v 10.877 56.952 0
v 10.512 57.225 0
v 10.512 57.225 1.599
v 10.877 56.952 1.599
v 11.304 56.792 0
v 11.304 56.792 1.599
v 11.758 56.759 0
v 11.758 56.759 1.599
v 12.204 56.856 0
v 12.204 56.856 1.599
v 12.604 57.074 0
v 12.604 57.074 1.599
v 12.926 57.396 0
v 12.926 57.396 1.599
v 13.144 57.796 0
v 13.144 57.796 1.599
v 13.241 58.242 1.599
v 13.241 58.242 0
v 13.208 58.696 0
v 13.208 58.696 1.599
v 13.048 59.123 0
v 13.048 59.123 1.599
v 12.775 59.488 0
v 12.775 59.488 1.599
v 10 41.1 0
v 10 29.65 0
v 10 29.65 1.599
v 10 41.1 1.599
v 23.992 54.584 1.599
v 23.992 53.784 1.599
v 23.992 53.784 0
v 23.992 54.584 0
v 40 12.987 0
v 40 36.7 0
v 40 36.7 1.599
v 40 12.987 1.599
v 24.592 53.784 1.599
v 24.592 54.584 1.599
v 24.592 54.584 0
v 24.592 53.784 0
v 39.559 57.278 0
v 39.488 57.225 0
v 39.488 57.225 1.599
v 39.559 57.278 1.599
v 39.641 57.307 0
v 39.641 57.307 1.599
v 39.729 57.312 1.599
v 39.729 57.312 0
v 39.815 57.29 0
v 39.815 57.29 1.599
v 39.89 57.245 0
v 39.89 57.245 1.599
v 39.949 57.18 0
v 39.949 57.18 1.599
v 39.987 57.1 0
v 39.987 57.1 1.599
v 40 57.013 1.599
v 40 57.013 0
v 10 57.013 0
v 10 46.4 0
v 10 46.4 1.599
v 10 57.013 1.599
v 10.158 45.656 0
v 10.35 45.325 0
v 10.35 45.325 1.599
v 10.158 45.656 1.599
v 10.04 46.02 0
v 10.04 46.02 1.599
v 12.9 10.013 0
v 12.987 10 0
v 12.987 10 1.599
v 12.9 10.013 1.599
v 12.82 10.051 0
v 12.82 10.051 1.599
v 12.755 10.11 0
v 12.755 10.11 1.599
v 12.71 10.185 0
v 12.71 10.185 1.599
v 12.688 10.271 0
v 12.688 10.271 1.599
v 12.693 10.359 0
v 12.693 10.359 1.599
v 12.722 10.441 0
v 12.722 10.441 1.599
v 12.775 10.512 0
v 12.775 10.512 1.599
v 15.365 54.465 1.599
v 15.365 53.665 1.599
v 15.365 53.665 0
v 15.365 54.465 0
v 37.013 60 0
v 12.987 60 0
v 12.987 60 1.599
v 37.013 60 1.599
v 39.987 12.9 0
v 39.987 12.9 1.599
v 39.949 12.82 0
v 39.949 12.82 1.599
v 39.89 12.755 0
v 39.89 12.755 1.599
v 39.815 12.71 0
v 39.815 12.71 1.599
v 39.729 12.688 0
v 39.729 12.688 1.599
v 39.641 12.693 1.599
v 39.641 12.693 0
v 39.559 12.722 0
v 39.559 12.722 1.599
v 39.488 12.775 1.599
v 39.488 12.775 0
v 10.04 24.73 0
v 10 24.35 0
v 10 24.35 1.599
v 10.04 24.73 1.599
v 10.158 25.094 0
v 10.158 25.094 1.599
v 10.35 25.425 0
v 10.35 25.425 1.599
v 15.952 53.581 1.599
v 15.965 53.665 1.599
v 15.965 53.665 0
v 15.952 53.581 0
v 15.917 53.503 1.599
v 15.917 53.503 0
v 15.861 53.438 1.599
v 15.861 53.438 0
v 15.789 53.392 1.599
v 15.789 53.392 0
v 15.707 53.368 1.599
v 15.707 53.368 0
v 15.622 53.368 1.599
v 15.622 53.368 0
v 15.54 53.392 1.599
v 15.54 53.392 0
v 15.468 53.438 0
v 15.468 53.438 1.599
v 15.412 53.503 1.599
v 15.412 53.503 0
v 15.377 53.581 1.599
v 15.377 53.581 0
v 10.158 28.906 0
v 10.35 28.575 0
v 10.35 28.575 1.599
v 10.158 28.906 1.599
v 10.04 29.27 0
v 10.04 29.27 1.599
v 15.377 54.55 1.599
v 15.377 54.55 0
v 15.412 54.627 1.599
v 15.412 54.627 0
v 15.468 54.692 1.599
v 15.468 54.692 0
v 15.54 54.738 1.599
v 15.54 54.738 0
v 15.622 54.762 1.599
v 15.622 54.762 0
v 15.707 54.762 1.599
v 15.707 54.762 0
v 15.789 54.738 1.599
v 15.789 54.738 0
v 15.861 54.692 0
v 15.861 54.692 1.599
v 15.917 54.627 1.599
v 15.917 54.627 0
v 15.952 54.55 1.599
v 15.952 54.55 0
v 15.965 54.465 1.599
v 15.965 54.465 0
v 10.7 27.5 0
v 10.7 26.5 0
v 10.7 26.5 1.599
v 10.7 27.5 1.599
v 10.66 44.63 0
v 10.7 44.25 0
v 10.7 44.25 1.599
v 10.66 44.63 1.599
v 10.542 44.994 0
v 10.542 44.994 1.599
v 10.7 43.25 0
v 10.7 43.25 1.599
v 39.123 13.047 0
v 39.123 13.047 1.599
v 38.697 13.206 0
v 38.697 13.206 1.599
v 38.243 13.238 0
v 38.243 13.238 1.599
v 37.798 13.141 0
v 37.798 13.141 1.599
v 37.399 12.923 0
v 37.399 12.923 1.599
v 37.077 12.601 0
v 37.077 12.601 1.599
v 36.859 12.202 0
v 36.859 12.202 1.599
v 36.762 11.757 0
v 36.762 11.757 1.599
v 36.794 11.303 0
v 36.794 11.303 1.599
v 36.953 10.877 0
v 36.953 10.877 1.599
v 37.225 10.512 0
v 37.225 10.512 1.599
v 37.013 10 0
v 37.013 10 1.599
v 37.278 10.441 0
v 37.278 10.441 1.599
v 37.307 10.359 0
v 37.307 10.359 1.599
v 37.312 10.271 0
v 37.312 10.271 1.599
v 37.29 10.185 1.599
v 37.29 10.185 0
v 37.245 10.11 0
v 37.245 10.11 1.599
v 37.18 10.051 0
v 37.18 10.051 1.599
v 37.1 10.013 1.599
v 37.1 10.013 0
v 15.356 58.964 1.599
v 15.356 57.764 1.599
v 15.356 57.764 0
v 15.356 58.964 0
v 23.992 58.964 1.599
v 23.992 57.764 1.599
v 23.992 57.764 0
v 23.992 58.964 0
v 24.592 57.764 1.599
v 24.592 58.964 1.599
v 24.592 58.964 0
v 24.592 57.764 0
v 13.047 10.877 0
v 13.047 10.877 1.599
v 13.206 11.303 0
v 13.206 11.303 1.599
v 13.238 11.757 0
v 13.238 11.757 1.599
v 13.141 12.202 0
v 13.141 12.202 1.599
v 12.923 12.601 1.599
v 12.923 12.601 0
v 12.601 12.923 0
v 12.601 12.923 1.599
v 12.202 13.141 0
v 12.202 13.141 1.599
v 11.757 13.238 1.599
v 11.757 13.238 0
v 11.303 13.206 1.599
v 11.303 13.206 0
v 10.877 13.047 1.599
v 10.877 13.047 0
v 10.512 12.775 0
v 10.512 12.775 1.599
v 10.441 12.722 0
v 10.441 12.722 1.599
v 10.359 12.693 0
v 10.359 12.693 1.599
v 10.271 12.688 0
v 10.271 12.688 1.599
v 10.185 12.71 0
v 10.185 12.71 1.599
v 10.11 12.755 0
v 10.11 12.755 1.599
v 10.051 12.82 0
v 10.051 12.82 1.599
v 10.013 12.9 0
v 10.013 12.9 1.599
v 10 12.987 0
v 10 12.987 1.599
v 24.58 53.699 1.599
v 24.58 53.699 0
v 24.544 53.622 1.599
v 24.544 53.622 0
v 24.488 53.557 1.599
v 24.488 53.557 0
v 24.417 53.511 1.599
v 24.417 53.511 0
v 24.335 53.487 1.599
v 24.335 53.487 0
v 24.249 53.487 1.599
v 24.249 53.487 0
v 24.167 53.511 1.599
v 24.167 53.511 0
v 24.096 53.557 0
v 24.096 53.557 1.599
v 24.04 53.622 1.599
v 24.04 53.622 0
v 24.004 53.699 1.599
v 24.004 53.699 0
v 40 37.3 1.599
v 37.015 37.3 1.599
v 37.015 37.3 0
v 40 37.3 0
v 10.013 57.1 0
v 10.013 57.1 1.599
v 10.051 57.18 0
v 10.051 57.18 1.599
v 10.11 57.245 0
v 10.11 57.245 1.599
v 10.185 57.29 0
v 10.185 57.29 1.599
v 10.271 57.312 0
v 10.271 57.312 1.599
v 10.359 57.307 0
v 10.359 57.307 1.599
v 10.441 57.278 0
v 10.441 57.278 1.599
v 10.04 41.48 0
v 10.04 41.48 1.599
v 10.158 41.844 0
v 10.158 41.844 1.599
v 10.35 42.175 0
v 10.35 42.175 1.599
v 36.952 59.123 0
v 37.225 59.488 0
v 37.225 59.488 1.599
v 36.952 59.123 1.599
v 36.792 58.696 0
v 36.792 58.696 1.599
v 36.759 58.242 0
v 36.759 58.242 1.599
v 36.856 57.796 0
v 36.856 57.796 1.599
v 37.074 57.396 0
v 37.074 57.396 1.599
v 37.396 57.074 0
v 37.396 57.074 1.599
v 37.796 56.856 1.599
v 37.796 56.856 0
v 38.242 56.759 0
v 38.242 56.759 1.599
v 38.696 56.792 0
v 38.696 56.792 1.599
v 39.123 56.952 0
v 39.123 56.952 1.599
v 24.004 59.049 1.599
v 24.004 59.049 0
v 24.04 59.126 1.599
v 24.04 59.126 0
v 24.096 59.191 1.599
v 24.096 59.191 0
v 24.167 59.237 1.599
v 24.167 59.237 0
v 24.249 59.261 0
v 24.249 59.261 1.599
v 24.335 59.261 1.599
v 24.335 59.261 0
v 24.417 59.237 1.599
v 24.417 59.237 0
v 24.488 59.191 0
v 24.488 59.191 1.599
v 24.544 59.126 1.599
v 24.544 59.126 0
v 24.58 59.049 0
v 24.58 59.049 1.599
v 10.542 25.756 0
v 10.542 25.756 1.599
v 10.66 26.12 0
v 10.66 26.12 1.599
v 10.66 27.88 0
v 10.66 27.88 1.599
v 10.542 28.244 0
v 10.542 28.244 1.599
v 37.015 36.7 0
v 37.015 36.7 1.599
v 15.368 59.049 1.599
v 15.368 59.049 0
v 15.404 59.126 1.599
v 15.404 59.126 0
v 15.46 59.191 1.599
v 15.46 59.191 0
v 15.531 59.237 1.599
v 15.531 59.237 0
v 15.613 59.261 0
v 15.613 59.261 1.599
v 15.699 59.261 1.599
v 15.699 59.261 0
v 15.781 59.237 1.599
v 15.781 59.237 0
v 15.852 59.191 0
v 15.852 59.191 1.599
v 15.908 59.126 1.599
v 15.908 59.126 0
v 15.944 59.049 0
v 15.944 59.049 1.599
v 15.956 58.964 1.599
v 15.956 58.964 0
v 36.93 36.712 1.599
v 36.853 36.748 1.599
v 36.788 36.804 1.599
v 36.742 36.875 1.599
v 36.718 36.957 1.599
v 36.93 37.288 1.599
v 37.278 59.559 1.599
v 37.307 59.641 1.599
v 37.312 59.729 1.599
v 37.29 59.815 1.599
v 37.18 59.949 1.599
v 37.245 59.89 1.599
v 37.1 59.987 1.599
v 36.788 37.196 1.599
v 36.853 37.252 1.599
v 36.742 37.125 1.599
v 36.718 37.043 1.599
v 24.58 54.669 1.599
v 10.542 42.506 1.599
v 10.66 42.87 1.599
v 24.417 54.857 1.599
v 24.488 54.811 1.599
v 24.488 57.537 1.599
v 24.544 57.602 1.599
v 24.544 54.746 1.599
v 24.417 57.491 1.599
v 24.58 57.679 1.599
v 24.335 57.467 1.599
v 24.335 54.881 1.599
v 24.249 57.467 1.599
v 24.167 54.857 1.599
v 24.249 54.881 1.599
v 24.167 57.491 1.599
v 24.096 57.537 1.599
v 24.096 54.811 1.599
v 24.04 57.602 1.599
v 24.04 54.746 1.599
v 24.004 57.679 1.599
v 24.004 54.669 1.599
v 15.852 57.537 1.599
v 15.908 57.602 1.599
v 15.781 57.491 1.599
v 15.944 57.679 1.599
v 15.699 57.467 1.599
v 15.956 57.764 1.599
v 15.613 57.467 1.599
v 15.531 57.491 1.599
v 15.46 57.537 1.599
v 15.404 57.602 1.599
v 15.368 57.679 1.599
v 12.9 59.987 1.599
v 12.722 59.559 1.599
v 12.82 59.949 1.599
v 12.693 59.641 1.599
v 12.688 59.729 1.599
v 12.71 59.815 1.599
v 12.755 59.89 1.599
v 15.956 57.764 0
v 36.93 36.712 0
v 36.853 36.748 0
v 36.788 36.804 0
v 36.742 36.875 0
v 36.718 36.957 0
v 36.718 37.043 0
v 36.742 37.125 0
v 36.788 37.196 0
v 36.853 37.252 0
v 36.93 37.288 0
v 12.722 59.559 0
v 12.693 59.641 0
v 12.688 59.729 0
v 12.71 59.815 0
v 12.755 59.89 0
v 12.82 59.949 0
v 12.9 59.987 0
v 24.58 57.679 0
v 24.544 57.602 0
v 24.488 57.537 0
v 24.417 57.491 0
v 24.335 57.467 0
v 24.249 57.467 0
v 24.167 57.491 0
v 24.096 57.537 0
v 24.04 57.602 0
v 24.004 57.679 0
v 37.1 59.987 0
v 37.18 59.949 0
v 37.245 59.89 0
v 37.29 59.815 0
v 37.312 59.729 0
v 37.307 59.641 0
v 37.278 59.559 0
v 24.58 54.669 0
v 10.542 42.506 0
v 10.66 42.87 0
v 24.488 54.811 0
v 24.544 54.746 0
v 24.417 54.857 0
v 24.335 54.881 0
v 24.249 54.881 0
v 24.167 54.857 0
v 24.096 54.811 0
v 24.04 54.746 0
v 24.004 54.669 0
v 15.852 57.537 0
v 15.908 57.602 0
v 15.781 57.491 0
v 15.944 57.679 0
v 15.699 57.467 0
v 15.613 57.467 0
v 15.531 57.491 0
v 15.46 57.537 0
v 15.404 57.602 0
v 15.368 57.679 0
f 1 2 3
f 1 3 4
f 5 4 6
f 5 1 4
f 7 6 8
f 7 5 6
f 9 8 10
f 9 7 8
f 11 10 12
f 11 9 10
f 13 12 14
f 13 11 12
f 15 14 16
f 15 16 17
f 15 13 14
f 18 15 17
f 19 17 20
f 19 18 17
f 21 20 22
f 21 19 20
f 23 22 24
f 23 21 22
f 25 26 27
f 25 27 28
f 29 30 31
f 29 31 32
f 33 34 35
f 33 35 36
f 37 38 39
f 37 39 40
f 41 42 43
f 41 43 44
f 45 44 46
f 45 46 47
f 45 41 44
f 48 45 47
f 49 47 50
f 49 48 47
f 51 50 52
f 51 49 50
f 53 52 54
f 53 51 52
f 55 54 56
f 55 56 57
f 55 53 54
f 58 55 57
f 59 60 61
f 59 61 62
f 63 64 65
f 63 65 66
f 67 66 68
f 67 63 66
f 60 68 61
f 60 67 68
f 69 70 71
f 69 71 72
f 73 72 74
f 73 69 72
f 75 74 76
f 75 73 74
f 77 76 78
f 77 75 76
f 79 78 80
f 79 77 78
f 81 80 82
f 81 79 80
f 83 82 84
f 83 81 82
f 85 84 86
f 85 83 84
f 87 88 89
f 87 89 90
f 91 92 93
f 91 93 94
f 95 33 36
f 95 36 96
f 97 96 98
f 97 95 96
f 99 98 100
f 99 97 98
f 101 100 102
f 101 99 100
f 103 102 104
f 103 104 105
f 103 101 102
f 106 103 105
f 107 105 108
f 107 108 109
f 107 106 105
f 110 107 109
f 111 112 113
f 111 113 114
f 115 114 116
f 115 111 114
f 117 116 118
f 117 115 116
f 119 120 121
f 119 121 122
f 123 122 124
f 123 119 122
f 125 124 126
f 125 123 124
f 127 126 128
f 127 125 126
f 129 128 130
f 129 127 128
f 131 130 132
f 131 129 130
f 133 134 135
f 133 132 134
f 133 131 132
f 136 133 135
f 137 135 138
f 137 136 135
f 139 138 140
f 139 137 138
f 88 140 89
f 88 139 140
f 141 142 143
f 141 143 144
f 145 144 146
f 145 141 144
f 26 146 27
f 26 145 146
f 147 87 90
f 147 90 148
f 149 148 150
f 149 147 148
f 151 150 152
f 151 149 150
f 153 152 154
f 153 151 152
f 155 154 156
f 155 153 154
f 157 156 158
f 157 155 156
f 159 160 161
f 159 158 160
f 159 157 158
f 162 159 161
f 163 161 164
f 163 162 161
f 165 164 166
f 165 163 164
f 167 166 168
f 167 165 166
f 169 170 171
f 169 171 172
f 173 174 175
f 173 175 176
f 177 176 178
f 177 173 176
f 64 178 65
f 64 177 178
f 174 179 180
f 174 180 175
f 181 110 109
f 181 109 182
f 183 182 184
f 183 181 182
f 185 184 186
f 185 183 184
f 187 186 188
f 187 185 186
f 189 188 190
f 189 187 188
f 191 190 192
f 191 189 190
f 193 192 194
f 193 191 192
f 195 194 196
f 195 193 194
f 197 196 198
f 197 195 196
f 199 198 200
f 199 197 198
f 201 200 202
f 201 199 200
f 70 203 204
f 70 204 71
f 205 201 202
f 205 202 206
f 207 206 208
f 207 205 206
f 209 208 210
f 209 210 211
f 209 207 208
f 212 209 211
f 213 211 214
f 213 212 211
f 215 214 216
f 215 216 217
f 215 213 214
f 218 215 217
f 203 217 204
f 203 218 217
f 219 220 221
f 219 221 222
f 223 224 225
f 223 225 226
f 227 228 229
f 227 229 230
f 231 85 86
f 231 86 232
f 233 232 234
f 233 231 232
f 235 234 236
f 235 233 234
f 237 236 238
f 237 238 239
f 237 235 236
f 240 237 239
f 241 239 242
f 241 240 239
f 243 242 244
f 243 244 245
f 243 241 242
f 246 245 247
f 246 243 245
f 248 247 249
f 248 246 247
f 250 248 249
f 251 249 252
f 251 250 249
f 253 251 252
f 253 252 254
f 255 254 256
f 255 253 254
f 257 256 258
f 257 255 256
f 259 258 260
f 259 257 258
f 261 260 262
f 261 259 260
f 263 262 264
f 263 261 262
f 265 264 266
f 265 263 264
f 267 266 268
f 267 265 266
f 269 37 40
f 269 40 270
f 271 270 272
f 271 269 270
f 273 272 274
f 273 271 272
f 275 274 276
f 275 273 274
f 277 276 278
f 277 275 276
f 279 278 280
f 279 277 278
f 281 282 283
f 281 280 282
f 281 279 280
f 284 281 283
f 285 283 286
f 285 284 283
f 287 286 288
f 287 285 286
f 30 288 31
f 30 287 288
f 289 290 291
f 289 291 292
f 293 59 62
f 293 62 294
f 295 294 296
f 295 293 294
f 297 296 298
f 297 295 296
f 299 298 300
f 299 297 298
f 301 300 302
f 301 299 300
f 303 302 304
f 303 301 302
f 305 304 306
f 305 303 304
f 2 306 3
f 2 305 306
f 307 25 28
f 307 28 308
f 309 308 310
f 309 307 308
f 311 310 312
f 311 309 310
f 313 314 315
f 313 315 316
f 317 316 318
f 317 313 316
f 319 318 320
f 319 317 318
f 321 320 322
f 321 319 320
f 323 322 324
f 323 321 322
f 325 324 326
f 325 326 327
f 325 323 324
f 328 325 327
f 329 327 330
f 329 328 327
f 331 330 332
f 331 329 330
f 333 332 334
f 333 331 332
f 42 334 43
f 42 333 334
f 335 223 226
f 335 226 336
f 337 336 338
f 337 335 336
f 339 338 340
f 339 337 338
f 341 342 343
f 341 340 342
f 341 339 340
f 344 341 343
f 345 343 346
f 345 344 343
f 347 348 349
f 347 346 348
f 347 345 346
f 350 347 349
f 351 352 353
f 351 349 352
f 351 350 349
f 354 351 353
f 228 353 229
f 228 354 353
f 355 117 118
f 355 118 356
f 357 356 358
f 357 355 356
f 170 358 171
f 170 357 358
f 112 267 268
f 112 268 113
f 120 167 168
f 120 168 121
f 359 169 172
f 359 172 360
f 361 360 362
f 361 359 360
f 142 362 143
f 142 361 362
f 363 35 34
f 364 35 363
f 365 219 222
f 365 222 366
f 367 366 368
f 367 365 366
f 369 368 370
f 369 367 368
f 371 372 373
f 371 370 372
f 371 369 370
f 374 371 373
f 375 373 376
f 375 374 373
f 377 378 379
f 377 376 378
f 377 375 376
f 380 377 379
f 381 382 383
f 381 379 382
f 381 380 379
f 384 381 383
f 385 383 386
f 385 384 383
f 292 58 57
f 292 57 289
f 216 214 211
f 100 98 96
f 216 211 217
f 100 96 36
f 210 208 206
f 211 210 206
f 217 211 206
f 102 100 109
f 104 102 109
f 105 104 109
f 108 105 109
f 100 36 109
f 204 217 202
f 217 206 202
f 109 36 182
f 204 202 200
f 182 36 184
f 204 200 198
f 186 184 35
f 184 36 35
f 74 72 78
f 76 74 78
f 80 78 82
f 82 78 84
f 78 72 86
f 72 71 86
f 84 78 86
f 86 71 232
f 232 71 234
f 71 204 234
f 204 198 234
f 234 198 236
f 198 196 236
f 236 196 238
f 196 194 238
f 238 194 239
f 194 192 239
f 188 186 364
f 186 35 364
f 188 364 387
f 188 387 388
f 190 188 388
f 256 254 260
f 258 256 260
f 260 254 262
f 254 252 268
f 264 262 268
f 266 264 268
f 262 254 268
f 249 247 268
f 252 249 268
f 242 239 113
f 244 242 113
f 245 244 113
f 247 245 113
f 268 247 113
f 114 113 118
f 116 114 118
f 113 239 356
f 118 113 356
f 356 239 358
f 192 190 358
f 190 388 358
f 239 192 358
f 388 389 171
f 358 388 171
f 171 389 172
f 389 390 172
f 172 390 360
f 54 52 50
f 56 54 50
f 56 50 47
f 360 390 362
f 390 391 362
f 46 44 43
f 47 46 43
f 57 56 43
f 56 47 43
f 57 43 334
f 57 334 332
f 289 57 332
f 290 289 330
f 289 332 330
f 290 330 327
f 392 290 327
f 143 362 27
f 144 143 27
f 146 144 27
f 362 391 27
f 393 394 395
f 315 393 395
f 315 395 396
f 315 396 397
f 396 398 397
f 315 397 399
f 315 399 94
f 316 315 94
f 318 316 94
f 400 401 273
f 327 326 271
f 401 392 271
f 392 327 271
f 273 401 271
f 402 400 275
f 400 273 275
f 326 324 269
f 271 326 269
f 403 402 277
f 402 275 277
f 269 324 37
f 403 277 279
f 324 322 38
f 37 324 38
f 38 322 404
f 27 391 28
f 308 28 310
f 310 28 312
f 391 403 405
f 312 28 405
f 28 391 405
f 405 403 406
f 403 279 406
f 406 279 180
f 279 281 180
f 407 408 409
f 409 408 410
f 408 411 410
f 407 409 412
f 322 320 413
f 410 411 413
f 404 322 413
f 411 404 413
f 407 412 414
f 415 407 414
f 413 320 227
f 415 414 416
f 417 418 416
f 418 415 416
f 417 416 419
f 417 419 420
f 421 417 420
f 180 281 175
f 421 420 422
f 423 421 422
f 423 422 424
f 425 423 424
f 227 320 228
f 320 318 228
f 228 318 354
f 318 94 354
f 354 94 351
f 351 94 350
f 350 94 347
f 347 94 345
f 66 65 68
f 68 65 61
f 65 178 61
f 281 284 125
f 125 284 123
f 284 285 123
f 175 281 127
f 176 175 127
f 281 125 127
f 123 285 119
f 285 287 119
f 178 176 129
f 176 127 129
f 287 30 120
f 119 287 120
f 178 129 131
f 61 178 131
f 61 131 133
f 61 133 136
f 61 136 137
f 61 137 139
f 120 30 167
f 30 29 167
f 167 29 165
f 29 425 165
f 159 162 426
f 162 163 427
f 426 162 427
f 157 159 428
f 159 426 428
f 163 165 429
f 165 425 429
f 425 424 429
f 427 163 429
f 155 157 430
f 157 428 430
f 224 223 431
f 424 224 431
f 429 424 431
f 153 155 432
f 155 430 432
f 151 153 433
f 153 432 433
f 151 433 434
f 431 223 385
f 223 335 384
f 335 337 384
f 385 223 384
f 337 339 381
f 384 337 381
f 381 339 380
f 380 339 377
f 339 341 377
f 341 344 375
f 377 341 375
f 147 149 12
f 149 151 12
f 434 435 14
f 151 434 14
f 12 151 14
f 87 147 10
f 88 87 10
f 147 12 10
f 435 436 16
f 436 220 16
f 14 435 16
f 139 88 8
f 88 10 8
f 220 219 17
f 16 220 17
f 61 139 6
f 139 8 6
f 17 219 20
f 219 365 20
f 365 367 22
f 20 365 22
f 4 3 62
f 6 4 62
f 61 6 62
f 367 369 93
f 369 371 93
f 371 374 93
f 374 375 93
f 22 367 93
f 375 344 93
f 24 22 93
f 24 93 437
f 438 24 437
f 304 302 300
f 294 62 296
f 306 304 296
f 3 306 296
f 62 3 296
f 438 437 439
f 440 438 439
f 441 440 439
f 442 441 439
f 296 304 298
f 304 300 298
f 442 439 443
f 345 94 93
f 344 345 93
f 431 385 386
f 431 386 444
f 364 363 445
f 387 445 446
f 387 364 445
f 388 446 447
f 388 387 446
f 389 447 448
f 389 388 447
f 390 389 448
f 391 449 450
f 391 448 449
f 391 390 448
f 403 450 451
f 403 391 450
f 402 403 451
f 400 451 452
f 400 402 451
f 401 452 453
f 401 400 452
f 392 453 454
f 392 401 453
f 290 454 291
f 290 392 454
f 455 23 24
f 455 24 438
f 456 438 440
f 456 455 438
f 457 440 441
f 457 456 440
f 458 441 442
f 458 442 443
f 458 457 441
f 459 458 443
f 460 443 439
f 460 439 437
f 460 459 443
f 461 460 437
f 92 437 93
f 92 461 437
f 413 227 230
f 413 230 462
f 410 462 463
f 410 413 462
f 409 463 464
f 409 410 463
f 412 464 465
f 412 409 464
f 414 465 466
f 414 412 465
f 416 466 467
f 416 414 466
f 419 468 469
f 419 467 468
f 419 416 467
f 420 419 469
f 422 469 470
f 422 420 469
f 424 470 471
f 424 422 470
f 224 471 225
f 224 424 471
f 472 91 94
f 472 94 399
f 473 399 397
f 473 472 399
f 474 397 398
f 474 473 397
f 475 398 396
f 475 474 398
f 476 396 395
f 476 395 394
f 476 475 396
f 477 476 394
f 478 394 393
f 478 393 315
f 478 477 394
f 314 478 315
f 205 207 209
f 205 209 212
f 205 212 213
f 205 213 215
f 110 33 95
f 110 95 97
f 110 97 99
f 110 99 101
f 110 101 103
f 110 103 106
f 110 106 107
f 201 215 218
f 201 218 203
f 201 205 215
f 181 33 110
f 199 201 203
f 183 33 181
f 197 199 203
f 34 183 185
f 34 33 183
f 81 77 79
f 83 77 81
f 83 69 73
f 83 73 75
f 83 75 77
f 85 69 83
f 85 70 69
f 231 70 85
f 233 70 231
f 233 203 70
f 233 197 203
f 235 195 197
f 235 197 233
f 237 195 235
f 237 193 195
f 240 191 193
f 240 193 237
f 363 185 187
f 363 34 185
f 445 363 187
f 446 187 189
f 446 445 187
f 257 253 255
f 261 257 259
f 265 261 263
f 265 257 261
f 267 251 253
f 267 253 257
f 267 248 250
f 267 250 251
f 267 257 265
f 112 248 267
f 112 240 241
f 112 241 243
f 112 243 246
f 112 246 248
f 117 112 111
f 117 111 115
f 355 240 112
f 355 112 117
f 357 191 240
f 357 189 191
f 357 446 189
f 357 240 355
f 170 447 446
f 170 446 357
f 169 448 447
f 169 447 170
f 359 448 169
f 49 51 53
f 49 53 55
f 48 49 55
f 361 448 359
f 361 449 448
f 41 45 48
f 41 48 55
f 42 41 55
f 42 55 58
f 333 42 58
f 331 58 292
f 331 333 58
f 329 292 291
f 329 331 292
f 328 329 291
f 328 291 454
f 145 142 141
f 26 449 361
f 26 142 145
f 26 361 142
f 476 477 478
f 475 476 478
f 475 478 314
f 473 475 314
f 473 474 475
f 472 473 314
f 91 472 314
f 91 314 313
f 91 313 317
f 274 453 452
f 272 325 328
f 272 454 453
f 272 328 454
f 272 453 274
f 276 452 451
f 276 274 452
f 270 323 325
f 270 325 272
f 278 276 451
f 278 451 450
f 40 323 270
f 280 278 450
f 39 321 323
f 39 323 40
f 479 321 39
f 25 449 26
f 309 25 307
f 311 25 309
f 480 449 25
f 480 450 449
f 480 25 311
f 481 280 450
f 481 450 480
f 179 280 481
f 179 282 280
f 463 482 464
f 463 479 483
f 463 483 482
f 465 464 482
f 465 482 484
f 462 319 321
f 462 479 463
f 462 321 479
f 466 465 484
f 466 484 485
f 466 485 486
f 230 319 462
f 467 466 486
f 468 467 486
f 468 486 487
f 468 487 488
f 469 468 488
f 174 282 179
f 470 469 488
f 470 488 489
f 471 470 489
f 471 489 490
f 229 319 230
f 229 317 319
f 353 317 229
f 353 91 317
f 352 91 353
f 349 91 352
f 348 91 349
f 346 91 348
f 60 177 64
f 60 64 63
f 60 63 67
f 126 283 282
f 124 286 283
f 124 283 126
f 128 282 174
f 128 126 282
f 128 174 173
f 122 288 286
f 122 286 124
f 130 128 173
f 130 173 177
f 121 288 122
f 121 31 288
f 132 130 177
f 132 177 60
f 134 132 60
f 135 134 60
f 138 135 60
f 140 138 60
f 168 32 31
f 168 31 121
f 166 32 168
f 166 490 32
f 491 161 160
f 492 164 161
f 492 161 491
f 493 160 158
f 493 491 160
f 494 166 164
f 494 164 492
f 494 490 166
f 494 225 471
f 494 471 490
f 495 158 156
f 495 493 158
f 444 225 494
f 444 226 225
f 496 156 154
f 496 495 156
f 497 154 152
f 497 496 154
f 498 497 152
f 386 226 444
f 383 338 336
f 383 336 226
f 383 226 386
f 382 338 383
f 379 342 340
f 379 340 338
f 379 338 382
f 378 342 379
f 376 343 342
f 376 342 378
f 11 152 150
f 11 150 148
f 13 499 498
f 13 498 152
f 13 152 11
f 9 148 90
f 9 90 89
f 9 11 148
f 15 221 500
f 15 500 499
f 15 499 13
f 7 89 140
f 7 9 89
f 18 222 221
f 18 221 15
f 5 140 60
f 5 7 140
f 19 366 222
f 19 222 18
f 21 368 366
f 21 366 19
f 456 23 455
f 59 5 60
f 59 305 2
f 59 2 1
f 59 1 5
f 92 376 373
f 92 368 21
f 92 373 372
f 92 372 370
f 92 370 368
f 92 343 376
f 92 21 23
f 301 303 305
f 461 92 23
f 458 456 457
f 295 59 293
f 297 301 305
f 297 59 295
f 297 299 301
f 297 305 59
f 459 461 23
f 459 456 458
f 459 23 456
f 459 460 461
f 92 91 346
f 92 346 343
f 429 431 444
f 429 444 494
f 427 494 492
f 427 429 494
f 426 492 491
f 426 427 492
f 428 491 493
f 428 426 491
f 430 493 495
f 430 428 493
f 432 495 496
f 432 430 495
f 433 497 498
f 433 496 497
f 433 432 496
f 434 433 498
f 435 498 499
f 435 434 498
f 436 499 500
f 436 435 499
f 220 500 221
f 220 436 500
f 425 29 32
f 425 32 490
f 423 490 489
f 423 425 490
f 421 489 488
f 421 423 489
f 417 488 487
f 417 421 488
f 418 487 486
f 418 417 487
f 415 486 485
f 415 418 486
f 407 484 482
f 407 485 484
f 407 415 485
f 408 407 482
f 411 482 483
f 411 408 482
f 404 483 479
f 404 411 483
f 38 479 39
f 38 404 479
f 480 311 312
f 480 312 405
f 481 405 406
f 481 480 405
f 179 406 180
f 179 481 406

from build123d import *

# Parameters (mm, degrees)
BOARD_DEPTH        = 1.59936
CUT_EXTRUDE2_DEPTH = 2.59936
CUT_EXTRUDE3_DEPTH = 2.59936


with BuildPart() as part:
    # Sketch1 → Board (new body)
    with BuildSketch(Plane.XY):
        with BuildLine():
            Line((10, 12.987), (10, 24.35))
            ThreePointArc((10, 24.35), (10.089703362, 24.915270998), (10.35, 25.425))
            ThreePointArc((10.35, 25.425), (10.610296638, 25.934729002), (10.7, 26.5))
            Line((10.7, 26.5), (10.7, 27.5))
            ThreePointArc((10.7, 27.5), (10.610296638, 28.065270998), (10.35, 28.575))
            ThreePointArc((10.35, 28.575), (10.089703362, 29.084729002), (10, 29.65))
            Line((10, 29.65), (10, 41.1))
            ThreePointArc((10, 41.1), (10.089703362, 41.665270998), (10.35, 42.175))
            ThreePointArc((10.35, 42.175), (10.610296638, 42.684729002), (10.7, 43.25))
            Line((10.7, 43.25), (10.7, 44.25))
            ThreePointArc((10.7, 44.25), (10.610296638, 44.815270998), (10.35, 45.325))
            ThreePointArc((10.35, 45.325), (10.089703362, 45.834729002), (10, 46.4))
            Line((10, 46.4), (10, 57.01299))
            ThreePointArc((10, 57.01299), (10.185195521, 57.290150019), (10.51213, 57.22512))
            ThreePointArc((10.51213, 57.22512), (12.776257609, 57.223732391), (12.77487, 59.48786))
            ThreePointArc((12.77487, 59.48786), (12.709829188, 59.814802566), (12.987, 60))
            Line((12.987, 60), (37.01299, 60))
            ThreePointArc((37.01299, 60), (37.290150019, 59.814804479), (37.22512, 59.48787))
            ThreePointArc((37.22512, 59.48787), (37.223732391, 57.223742391), (39.48786, 57.22513))
            ThreePointArc((39.48786, 57.22513), (39.814807186, 57.290168899), (40, 57.01299))
            Line((40, 57.01299), (40, 12.987))
            ThreePointArc((40, 12.987), (39.814804479, 12.709839981), (39.48787, 12.77487))
            ThreePointArc((39.48787, 12.77487), (37.226515909, 12.773484091), (37.22513, 10.51213))
            ThreePointArc((37.22513, 10.51213), (37.290158106, 10.185190901), (37.01299, 10))
            Line((37.01299, 10), (12.987, 10))
            ThreePointArc((12.987, 10), (12.709839981, 10.185195521), (12.77487, 10.51213))
            ThreePointArc((12.77487, 10.51213), (12.773484091, 12.773484091), (10.51213, 12.77487))
            ThreePointArc((10.51213, 12.77487), (10.185195521, 12.709839981), (10, 12.987))
        make_face()
    extrude(amount=BOARD_DEPTH)

    # Sketch17 → Cut-Extrude2 (cut, through all)
    with BuildSketch(Plane.XY.offset(1.59936)):
        with BuildLine():
            Line((24.592, 58.964), (24.592, 57.764))
            ThreePointArc((24.592, 57.764), (24.292, 57.464), (23.992, 57.764))
            Line((23.992, 57.764), (23.992, 58.964))
            ThreePointArc((23.992, 58.964), (24.292, 59.264), (24.592, 58.964))
        make_face()
        with BuildLine():
            Line((24.592, 54.584), (24.592, 53.784))
            ThreePointArc((24.592, 53.784), (24.292, 53.484), (23.992, 53.784))
            Line((23.992, 53.784), (23.992, 54.584))
            ThreePointArc((23.992, 54.584), (24.292, 54.884), (24.592, 54.584))
        make_face()
        with BuildLine():
            Line((15.96453, 54.46518), (15.96453, 53.66518))
            ThreePointArc((15.96453, 53.66518), (15.66453, 53.36518), (15.36453, 53.66518))
            Line((15.36453, 53.66518), (15.36453, 54.46518))
            ThreePointArc((15.36453, 54.46518), (15.66453, 54.76518), (15.96453, 54.46518))
        make_face()
        with BuildLine():
            Line((15.956, 58.964), (15.956, 57.764))
            ThreePointArc((15.956, 57.764), (15.656, 57.464), (15.356, 57.764))
            Line((15.356, 57.764), (15.356, 58.964))
            ThreePointArc((15.356, 58.964), (15.656, 59.264), (15.956, 58.964))
        make_face()
    extrude(amount=-CUT_EXTRUDE2_DEPTH, mode=Mode.SUBTRACT)

    # Sketch18 → Cut-Extrude3 (cut, through all)
    with BuildSketch(Plane.XY.offset(1.59936)):
        with BuildLine():
            Line((37.015, 37.3), (41.715, 37.3))
            Line((41.715, 37.3), (41.715, 36.7))
            Line((41.715, 36.7), (37.015, 36.7))
            ThreePointArc((37.015, 36.7), (36.714999967, 37), (37.015, 37.3))
        make_face()
    extrude(amount=-CUT_EXTRUDE3_DEPTH, mode=Mode.SUBTRACT)


solid = part.part
